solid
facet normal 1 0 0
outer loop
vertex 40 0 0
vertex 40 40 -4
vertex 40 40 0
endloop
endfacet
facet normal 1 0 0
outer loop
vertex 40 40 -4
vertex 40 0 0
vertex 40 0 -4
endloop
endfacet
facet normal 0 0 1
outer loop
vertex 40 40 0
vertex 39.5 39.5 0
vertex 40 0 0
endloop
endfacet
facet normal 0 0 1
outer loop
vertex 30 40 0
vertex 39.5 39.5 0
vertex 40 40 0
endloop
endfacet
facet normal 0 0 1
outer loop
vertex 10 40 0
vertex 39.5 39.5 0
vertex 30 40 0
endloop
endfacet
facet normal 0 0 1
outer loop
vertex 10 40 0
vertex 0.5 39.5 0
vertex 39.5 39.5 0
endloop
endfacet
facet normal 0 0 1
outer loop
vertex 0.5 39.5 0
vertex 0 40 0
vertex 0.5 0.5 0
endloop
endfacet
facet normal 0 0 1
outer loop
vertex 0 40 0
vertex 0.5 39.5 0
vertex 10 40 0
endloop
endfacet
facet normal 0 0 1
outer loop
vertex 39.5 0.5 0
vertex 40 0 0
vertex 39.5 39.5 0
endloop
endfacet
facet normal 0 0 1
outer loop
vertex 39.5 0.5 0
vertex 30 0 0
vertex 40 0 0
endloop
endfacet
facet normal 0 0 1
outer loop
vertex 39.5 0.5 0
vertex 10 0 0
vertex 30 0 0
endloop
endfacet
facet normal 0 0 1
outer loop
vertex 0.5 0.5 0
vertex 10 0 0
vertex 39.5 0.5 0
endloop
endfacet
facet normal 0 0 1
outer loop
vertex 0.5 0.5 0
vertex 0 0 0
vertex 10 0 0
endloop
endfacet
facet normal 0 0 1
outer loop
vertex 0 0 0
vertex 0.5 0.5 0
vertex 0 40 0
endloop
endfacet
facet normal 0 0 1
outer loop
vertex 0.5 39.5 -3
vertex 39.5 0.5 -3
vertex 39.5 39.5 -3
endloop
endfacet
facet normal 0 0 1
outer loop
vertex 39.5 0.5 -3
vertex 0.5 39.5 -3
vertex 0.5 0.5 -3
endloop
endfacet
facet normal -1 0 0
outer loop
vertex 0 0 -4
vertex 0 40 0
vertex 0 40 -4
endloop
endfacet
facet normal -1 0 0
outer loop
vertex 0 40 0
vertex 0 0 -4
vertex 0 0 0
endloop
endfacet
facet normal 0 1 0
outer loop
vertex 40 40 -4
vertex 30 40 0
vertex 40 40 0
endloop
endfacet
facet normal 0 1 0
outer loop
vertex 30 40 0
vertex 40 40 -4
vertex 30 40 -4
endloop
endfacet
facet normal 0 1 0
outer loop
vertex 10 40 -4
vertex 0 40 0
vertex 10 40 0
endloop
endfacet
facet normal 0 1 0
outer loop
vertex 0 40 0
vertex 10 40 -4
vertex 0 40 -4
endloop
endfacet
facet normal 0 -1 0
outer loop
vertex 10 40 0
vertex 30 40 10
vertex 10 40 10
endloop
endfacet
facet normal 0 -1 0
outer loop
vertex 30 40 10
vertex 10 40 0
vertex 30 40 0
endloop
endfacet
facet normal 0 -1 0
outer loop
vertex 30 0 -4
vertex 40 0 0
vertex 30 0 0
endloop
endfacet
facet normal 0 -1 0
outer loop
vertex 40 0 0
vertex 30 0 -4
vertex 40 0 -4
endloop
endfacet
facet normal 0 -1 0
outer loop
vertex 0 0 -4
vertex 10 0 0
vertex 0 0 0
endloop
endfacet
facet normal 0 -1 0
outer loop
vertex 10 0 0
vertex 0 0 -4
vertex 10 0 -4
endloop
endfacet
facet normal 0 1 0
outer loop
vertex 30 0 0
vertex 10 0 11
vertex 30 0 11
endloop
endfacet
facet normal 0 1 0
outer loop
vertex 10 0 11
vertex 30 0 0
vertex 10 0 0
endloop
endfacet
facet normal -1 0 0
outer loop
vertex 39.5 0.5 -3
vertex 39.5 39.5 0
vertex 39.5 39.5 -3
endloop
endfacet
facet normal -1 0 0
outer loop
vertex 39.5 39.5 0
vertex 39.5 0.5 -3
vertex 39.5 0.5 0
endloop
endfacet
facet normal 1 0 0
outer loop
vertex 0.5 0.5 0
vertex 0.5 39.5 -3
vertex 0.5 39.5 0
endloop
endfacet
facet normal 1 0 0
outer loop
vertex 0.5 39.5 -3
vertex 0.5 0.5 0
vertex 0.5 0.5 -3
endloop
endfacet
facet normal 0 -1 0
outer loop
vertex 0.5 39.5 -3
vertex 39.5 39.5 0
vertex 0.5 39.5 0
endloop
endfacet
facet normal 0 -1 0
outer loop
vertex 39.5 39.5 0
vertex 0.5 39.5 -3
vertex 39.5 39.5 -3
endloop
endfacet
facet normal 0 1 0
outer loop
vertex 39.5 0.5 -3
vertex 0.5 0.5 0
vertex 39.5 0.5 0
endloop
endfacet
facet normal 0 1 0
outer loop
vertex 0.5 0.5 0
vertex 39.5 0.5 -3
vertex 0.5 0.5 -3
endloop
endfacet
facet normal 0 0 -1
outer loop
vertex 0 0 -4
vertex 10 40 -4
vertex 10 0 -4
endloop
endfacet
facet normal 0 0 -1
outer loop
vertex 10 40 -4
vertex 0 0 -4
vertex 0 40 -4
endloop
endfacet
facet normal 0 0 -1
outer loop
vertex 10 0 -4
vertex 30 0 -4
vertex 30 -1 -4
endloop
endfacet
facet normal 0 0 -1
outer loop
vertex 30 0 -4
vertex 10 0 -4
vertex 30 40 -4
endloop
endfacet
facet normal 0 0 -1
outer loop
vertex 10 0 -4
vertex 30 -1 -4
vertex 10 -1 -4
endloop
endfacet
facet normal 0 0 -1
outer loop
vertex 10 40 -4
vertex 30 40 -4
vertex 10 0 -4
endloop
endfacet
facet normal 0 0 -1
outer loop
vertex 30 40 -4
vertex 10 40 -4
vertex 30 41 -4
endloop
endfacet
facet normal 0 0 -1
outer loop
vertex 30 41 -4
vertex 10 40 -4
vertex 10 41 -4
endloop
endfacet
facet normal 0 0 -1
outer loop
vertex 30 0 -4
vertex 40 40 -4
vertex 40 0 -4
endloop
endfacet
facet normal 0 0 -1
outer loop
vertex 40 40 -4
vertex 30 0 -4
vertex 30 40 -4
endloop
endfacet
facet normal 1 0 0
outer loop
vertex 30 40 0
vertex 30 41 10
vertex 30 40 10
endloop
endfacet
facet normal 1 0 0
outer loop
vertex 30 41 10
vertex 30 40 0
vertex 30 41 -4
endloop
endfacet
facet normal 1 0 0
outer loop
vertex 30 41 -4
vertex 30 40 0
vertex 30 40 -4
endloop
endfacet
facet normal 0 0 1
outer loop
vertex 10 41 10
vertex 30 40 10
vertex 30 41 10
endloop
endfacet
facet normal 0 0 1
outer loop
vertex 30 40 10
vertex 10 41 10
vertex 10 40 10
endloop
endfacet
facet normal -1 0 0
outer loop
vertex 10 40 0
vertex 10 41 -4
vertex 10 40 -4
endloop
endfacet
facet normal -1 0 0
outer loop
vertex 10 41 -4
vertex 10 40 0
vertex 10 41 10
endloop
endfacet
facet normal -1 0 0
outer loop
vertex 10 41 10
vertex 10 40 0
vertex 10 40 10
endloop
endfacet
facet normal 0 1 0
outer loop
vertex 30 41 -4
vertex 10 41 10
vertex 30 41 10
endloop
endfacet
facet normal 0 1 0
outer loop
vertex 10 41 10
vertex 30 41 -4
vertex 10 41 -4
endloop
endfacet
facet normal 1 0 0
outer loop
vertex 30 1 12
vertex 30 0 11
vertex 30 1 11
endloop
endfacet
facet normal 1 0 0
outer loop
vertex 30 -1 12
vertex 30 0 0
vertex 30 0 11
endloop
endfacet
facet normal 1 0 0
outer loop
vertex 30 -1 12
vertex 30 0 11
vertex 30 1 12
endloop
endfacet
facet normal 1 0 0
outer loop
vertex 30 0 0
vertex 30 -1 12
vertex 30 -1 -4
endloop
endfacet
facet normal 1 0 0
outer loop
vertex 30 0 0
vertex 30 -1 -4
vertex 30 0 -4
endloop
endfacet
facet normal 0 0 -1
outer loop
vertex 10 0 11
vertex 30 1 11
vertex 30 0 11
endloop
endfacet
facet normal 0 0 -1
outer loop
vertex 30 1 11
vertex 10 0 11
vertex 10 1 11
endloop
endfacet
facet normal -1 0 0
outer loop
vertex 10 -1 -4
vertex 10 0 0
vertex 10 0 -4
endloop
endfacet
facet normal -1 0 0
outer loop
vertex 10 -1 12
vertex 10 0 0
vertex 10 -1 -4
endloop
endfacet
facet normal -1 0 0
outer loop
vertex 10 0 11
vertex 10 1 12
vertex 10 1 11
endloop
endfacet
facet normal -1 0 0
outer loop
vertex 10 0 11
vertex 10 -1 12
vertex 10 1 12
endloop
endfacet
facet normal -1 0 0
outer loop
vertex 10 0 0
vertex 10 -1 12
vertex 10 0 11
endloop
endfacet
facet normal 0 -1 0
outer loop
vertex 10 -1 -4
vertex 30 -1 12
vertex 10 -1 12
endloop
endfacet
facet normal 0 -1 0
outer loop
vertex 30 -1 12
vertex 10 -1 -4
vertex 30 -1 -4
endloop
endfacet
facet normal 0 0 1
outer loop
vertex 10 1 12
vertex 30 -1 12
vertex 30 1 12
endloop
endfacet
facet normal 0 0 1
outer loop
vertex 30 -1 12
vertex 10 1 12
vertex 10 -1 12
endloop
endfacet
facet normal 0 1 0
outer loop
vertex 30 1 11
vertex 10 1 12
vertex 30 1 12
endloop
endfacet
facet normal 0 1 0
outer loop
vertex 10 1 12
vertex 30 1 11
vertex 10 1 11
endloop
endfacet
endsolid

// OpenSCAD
thickness = 1;

translate([0, 0, -thickness-3]) cube([40, 40, thickness]);
translate([0, 0, -3]) difference() {
    translate([0, 0, 0]) cube([40, 40, 3]);
    translate([0.5, 0.5, 0]) cube([40-0.5*2, 40-0.5*2, 3]);
}

translate([(40-20)/2, 40, -thickness-3]) cube([20, thickness, 10+3+thickness]);

translate([(40-20)/2, -thickness, -thickness-3]) cube([20, thickness, 10+1+3+thickness]);
translate([(40-20)/2, -thickness, 10+1]) cube([20, thickness+1, thickness]);
